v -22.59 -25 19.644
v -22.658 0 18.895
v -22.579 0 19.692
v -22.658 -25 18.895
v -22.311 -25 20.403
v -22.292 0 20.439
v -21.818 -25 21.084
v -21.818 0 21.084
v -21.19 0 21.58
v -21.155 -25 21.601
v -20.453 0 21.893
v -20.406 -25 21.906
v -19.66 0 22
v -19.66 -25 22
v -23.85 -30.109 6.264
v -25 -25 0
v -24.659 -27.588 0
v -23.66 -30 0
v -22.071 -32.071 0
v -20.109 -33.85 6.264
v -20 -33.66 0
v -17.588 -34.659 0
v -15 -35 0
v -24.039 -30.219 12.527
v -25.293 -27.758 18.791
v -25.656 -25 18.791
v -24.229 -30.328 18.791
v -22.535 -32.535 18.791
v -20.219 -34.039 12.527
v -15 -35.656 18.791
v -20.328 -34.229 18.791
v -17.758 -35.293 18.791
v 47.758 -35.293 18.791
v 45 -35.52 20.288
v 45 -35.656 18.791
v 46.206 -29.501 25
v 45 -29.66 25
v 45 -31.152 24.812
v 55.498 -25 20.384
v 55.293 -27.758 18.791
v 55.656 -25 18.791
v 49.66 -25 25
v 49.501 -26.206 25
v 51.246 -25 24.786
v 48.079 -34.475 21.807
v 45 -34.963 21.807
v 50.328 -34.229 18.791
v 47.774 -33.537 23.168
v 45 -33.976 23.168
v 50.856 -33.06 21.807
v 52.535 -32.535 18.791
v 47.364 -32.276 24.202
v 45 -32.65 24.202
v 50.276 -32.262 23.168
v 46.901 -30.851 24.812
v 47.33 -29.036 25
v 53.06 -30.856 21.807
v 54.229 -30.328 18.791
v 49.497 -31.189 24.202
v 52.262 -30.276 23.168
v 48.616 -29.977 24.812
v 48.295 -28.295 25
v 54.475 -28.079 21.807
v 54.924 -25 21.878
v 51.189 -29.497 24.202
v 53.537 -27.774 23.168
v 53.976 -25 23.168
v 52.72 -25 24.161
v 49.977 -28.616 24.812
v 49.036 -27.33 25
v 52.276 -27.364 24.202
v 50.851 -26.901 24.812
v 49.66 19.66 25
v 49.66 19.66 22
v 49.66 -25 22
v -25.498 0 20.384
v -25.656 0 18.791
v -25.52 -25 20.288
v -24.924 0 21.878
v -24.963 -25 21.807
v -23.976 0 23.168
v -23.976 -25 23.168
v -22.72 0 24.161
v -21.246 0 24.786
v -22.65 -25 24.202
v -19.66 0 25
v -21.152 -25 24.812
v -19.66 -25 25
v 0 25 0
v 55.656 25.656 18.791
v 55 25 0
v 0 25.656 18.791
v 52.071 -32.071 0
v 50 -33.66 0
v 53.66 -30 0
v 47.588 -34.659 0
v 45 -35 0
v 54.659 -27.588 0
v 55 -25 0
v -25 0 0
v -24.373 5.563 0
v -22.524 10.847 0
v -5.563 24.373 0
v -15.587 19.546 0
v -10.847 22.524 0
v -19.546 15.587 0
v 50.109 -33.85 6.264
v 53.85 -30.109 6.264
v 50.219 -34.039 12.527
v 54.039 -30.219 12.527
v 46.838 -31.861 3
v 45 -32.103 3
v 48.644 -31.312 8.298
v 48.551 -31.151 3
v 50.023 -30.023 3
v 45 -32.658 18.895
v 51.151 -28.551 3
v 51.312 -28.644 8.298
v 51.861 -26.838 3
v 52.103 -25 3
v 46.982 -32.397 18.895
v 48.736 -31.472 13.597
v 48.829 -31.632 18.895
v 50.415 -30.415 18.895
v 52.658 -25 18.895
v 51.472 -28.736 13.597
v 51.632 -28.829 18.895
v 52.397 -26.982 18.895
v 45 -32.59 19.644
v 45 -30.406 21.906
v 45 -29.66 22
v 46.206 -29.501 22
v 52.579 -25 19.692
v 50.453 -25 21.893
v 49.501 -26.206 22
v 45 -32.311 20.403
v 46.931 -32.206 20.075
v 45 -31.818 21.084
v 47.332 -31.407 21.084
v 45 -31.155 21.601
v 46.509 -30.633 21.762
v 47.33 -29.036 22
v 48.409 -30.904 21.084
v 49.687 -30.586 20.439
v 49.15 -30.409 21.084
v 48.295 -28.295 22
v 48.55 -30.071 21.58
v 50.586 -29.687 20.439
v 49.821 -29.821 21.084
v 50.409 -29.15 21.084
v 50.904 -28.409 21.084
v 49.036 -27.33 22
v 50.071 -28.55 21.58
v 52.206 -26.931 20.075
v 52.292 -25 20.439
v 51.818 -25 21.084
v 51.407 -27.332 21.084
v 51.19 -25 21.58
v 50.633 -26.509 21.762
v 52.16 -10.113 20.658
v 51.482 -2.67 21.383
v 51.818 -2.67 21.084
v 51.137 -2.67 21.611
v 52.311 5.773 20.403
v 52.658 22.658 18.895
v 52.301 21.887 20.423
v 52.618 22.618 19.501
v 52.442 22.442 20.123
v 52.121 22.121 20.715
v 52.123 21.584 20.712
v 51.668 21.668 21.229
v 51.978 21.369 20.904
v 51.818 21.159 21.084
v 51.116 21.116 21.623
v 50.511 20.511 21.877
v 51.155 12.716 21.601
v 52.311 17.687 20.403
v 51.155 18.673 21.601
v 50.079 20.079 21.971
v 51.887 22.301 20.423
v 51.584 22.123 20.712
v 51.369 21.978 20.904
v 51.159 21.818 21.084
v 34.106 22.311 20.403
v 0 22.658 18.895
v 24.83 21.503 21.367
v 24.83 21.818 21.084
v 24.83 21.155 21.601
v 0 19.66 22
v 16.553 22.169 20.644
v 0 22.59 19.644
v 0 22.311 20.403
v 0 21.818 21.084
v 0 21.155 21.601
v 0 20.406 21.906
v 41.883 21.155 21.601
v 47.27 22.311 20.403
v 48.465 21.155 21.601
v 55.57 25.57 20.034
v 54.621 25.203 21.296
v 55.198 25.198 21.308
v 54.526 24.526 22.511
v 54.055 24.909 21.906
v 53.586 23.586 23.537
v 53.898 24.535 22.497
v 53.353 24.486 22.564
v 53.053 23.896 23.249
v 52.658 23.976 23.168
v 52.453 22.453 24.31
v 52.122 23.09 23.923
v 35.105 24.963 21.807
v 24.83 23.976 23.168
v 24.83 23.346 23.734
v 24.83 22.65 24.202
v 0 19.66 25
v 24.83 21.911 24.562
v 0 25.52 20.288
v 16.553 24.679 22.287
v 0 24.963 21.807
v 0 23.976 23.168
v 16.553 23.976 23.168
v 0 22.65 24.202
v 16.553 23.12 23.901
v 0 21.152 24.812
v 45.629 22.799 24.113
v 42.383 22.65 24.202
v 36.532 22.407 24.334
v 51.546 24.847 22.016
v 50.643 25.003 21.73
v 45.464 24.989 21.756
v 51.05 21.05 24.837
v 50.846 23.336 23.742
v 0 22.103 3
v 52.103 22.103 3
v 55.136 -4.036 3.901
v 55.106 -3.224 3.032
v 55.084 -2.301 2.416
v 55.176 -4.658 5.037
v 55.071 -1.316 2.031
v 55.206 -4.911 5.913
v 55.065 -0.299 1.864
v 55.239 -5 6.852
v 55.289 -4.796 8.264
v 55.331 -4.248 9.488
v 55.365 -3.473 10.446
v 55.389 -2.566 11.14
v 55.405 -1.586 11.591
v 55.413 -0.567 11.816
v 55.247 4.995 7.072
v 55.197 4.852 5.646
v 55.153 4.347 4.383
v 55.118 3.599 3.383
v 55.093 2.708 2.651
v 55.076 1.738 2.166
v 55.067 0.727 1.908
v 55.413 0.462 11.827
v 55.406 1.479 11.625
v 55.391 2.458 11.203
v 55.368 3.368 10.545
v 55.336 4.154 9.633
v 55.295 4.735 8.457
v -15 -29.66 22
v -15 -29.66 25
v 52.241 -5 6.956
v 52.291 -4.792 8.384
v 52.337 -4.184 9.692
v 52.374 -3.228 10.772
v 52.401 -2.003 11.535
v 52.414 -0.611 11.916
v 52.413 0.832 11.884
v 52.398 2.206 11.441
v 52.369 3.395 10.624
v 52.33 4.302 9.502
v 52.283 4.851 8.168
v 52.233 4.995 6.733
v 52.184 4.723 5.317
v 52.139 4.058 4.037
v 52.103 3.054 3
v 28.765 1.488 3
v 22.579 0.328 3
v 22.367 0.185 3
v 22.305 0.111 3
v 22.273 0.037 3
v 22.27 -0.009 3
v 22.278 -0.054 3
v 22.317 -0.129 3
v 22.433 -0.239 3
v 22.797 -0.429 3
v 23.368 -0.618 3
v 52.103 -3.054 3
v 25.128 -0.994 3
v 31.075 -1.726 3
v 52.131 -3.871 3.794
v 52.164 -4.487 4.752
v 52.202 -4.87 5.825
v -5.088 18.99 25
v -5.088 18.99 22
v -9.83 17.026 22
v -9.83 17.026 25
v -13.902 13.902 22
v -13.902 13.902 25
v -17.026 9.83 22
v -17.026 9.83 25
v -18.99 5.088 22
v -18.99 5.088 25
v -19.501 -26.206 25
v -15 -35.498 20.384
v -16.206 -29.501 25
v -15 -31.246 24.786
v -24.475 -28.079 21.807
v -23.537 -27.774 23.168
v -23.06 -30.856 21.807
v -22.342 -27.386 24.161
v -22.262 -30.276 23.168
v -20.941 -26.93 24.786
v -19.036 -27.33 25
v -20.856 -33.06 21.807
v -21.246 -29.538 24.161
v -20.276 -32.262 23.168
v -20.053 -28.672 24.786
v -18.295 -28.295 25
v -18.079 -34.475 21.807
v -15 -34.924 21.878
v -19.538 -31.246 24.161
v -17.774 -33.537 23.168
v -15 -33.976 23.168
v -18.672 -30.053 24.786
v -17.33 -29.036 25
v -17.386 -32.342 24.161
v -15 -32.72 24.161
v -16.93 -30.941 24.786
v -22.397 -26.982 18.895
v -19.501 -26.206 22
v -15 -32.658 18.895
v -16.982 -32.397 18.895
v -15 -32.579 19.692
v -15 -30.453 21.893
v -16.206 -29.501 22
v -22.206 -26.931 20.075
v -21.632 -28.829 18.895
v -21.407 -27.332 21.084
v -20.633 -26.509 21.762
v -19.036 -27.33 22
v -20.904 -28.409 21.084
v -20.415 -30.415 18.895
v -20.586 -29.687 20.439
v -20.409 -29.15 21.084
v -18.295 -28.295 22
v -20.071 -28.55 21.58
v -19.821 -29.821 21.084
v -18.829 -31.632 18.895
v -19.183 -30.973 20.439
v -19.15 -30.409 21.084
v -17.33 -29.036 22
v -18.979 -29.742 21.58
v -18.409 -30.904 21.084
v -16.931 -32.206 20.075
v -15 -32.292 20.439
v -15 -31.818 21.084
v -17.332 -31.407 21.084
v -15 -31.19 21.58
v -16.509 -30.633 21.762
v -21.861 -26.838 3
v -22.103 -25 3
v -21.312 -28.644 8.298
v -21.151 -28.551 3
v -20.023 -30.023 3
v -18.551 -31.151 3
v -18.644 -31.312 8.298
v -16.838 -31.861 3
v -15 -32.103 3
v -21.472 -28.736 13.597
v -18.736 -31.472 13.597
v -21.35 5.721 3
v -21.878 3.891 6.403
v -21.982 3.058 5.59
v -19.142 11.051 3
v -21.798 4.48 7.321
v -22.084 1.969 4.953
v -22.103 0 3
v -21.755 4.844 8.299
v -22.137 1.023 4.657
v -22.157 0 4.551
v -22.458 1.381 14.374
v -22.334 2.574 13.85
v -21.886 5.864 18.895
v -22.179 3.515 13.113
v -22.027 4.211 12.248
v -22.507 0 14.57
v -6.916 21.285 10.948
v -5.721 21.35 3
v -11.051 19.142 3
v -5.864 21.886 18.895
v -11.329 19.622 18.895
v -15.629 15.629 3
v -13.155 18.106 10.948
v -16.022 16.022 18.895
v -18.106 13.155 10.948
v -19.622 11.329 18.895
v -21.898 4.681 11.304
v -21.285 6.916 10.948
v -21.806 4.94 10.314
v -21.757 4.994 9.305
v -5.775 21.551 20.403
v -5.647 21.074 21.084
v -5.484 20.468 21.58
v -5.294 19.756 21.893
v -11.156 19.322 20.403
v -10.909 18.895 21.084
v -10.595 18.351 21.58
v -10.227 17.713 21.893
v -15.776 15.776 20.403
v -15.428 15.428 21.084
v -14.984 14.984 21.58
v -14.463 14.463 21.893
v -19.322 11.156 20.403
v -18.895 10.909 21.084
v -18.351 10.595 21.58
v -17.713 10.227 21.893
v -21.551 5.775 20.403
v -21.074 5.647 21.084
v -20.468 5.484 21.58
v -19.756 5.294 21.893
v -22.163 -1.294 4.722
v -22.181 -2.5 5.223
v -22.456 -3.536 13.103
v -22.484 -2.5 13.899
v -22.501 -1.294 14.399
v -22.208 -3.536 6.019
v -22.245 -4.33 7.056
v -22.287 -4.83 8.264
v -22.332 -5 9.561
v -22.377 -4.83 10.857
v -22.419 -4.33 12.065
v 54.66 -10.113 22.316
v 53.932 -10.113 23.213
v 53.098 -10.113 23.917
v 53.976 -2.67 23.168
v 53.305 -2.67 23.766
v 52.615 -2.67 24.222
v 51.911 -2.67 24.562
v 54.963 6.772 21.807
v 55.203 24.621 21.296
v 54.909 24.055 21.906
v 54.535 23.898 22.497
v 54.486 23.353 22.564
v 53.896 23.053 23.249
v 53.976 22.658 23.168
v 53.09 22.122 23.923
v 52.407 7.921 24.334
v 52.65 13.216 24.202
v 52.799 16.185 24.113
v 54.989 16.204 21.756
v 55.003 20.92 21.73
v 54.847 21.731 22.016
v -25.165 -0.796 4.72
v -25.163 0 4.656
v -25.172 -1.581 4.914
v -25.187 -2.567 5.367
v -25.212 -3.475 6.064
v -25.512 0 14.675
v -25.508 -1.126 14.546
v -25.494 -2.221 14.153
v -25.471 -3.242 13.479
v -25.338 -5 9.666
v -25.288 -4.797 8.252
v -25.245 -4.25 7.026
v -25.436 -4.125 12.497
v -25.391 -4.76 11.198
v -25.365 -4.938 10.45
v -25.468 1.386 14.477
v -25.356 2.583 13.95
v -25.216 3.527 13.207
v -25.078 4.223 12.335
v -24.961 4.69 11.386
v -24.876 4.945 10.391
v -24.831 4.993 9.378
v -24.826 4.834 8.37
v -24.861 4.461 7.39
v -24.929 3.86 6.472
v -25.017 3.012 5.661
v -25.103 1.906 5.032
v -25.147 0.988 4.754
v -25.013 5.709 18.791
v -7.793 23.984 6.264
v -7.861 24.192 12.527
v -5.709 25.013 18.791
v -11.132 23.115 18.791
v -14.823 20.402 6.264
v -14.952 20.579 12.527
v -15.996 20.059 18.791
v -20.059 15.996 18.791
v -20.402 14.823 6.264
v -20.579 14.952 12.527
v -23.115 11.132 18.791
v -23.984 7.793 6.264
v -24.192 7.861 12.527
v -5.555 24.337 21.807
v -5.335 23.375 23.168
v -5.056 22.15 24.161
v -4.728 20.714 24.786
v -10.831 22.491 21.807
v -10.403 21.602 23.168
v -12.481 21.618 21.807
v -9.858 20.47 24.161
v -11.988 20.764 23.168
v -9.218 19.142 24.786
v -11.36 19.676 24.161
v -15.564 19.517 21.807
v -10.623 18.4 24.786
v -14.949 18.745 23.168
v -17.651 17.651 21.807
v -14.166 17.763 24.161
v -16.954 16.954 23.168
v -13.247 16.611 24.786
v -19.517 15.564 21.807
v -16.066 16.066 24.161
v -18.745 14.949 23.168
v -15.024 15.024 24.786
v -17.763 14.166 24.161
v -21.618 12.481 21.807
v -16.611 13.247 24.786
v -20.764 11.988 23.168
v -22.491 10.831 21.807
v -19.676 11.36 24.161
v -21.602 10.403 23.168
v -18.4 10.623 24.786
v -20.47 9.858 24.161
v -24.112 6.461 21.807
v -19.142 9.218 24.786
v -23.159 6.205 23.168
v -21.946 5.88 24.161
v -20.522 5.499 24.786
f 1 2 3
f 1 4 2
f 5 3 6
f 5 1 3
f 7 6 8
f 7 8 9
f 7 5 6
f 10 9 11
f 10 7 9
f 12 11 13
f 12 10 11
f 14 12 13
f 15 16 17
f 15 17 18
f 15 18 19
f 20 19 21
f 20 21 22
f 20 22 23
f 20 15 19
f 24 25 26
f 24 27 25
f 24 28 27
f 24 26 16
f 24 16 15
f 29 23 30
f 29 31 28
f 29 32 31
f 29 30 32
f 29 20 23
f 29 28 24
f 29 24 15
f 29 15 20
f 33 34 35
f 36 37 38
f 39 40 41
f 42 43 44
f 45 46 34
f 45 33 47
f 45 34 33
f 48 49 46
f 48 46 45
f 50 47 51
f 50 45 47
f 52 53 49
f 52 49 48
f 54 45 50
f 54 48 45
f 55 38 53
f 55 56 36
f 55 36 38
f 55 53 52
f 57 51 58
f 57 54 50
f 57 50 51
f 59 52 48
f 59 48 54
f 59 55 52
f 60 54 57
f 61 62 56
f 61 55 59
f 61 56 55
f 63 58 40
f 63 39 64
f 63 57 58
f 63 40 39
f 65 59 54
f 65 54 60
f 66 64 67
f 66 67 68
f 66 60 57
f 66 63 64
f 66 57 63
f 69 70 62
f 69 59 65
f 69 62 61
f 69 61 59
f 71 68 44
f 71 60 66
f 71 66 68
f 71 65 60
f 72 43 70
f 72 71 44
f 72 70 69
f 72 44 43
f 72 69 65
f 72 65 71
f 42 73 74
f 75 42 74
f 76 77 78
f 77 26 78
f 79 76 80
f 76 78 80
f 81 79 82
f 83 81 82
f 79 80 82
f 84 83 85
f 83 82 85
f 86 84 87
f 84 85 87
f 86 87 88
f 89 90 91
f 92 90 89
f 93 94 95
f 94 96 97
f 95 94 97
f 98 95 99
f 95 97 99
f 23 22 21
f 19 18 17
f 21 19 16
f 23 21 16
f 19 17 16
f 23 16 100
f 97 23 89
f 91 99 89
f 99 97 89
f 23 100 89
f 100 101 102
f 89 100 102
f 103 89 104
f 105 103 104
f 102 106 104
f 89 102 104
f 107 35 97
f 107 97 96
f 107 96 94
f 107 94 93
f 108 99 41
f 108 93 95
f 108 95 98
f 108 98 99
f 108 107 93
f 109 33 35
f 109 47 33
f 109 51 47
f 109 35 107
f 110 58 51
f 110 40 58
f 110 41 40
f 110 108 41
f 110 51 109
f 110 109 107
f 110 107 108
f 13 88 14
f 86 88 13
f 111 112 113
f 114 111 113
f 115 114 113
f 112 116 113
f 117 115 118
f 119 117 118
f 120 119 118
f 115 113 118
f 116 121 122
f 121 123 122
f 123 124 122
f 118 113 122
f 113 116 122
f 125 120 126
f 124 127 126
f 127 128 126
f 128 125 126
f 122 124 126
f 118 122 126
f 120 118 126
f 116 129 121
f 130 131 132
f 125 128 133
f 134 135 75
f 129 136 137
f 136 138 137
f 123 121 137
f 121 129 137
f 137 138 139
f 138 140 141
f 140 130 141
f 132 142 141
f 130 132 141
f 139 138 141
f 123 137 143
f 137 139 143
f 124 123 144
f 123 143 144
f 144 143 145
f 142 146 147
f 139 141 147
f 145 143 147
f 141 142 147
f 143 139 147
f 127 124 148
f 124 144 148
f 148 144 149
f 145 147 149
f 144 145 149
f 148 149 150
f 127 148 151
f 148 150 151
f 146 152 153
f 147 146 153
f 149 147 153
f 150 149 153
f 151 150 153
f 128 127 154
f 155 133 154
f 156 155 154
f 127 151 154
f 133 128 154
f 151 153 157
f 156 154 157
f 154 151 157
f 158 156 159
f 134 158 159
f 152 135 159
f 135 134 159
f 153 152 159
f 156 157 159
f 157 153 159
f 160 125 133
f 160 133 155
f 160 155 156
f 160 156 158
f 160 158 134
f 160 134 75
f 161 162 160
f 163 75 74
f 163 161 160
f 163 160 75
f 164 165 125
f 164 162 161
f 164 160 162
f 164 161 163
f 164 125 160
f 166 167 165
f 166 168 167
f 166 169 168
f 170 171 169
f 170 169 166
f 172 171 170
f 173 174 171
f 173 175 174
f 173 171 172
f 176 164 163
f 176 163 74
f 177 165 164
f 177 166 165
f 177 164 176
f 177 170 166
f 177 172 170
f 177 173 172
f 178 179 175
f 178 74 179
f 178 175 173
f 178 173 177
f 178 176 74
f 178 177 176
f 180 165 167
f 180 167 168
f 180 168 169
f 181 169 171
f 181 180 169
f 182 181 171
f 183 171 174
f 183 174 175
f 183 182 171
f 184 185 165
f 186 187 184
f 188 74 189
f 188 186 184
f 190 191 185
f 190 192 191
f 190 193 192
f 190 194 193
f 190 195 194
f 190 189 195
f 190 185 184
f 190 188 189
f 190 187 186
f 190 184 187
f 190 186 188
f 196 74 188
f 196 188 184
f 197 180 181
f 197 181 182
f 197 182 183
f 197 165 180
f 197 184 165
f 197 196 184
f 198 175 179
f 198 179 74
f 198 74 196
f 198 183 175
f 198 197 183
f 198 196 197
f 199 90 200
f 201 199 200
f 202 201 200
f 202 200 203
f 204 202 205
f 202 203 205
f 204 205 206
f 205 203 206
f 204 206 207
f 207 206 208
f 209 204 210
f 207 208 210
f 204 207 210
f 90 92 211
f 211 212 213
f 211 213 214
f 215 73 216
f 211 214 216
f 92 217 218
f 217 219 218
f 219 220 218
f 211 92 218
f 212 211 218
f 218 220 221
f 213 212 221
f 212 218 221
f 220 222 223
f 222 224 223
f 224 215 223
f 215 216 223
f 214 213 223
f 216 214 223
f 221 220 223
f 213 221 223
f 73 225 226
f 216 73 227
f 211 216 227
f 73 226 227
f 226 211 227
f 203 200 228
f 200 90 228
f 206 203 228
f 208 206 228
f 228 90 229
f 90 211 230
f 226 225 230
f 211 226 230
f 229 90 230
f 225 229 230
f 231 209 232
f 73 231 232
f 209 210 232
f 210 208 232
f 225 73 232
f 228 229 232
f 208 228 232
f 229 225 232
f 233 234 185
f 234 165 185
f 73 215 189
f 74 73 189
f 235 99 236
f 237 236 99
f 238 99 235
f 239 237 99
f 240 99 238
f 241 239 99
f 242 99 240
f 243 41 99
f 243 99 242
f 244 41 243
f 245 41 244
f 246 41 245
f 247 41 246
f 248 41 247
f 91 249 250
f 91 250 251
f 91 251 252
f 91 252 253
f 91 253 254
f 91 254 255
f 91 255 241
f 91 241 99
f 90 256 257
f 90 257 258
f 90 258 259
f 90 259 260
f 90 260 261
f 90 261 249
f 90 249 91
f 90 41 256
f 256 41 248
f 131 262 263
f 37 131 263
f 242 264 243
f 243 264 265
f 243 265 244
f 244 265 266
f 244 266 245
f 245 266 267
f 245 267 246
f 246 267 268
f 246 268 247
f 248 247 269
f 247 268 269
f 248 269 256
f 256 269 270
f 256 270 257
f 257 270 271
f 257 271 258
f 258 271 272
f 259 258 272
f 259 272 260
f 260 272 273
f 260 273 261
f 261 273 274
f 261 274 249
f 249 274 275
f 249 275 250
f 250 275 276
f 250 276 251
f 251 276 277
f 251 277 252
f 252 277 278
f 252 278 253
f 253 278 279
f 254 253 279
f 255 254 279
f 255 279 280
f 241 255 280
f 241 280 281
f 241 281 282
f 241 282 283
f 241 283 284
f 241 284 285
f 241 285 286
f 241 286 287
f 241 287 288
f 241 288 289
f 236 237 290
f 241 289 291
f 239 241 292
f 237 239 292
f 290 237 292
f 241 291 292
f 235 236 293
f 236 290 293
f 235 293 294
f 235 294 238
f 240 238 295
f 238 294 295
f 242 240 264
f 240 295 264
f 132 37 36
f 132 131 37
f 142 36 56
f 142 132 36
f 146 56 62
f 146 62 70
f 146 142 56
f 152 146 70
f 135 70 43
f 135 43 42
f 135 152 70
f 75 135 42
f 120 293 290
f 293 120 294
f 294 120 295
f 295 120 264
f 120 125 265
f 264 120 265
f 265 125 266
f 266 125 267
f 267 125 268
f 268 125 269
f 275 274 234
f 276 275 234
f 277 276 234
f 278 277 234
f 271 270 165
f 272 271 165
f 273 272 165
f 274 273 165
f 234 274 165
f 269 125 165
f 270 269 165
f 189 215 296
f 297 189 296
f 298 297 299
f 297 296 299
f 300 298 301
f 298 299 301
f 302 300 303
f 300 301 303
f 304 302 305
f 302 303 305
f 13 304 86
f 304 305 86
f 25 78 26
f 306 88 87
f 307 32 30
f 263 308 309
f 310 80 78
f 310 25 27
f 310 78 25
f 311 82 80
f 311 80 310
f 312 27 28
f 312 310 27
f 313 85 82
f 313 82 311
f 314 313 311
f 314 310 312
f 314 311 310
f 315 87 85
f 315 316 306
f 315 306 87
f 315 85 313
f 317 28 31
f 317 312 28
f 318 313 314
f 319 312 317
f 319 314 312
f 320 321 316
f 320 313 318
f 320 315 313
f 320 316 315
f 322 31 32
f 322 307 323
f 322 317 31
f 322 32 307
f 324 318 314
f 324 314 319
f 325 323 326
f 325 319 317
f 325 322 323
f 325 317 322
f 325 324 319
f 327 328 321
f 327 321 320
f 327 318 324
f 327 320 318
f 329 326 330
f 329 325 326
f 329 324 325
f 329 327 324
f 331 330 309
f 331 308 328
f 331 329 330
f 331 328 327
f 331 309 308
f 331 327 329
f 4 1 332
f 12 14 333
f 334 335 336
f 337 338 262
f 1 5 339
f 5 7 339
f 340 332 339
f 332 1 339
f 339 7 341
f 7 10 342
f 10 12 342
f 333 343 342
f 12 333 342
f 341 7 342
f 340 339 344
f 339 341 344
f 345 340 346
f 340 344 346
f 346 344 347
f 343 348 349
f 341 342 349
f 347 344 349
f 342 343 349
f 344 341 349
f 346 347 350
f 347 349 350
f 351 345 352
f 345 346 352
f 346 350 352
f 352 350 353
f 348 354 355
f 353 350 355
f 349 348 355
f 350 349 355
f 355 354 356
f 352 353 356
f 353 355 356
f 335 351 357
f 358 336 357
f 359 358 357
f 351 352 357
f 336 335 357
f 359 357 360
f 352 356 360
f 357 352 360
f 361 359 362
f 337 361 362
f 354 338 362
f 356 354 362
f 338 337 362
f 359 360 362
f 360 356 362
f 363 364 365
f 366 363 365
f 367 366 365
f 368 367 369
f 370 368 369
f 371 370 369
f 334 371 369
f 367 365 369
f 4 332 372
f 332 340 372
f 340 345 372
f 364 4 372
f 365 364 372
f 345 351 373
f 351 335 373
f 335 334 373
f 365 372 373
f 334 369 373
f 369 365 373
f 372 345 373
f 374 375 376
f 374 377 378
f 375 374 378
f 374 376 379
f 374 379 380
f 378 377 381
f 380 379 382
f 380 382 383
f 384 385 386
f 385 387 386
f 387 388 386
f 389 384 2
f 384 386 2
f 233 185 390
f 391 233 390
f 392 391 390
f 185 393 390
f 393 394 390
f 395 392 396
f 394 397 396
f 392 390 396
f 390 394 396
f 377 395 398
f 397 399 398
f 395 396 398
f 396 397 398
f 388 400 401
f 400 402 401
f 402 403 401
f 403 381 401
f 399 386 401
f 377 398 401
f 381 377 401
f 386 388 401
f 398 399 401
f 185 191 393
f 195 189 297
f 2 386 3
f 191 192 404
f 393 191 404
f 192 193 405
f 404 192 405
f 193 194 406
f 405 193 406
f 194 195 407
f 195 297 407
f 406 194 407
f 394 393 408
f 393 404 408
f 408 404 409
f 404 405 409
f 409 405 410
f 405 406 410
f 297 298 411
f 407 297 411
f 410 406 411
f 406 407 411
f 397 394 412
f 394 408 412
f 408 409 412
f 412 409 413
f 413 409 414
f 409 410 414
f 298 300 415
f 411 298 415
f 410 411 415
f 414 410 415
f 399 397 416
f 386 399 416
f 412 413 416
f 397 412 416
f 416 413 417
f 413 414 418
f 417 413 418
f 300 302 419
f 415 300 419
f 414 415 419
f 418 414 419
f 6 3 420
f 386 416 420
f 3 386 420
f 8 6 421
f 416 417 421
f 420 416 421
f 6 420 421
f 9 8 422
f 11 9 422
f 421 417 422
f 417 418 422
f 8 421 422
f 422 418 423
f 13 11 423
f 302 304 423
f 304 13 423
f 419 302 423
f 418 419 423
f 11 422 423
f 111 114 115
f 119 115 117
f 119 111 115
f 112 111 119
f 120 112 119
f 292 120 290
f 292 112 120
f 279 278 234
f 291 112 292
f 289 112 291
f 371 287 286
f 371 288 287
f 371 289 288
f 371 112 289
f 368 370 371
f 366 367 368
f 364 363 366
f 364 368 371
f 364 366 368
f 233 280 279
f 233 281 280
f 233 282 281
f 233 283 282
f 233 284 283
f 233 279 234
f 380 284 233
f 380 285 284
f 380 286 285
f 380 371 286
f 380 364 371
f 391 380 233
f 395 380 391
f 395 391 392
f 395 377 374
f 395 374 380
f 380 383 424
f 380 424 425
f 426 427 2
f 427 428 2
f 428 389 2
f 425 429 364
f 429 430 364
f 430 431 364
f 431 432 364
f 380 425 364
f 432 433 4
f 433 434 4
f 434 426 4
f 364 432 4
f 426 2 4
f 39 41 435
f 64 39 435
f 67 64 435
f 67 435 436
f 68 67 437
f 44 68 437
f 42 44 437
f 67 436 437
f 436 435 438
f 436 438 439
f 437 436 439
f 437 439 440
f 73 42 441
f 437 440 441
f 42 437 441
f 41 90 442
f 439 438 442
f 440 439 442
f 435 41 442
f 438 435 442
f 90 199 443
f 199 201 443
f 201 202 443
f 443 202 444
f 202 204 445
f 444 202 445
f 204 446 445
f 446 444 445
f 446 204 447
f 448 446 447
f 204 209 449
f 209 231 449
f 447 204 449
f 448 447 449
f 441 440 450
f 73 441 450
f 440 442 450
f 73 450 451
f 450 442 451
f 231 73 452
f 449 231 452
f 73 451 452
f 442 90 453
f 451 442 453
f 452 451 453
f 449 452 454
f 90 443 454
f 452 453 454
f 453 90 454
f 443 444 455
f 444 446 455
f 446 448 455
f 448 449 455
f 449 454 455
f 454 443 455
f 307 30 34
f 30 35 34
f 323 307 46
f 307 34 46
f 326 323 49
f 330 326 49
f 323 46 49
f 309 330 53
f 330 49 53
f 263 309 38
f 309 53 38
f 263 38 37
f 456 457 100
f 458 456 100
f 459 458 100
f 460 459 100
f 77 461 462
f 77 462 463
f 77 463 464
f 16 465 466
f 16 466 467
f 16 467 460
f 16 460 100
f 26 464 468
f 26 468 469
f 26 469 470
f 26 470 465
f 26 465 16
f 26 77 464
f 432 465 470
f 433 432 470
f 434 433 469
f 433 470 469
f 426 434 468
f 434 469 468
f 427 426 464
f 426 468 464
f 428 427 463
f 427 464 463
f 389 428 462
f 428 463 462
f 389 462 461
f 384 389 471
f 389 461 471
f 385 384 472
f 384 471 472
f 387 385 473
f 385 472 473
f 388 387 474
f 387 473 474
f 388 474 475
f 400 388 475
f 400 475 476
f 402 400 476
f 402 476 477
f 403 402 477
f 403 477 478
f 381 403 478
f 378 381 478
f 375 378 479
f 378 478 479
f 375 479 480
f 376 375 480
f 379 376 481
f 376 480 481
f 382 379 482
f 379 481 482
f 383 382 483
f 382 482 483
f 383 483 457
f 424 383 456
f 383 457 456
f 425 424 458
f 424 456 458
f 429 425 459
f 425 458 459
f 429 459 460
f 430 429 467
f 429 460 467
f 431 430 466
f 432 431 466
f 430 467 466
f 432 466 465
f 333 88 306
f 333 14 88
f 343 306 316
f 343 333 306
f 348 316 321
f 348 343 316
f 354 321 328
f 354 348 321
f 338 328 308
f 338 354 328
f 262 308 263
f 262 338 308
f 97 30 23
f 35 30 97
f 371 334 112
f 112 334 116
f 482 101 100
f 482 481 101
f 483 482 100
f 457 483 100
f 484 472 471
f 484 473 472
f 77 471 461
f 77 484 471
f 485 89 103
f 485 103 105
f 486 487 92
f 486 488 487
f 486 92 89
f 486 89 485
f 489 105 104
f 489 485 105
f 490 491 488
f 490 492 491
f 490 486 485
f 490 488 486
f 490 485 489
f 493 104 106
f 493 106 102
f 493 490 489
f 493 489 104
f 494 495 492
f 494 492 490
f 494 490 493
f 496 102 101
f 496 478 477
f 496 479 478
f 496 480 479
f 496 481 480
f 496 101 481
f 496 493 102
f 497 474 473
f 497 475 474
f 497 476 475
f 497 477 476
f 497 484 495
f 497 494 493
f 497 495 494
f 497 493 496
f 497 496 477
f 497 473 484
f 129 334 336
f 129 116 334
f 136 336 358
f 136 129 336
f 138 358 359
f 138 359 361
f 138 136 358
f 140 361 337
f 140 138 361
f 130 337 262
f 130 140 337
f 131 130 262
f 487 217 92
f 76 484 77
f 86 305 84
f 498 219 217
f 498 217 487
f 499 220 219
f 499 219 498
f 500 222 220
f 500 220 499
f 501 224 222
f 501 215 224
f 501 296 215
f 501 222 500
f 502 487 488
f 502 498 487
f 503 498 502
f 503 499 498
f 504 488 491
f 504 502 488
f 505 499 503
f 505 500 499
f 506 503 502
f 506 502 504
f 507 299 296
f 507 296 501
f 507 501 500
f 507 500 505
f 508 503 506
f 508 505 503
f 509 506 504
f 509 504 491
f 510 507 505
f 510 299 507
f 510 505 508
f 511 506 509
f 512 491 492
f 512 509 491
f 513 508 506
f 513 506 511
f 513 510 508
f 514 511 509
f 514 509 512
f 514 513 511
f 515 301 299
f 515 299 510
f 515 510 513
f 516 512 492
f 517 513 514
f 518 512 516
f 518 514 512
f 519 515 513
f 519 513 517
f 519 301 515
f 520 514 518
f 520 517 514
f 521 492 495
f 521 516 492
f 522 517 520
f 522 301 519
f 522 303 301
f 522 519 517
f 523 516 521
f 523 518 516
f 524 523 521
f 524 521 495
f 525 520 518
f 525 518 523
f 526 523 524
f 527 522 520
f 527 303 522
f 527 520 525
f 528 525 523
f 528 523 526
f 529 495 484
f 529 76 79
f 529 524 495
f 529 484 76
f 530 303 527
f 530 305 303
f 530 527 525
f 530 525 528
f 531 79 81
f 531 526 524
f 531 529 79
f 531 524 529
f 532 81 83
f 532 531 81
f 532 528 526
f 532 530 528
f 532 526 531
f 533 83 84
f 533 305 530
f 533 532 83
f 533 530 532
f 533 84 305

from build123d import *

# Parameters (mm, degrees)
F1_DEPTH = 25
F1_TAPER = -2
F2_R     = 6
F3_T     = 3
F5_D     = 10


# Not quite as in the source:
# - a shell that OpenCascade refuses in one call is made with other operations: the cavity is built on its own and cut out


with BuildPart() as f1:
    # F0 (on Top) → F1 (new body)
    with BuildSketch(Plane.XY):
        with BuildLine():
            Line((55, 25), (0, 25))
            ThreePointArc((0, 25), (-17.6776695297, 17.6776695297), (-25, 0))
            Line((-25, 0), (-25, -25))
            ThreePointArc((-25, -25), (-22.0710678119, -32.0710678119), (-15, -35))
            Line((-15, -35), (45, -35))
            ThreePointArc((45, -35), (52.0710678119, -32.0710678119), (55, -25))
            Line((55, -25), (55, 25))
        make_face()
    extrude(amount=F1_DEPTH, taper=F1_TAPER)

    # F2
    f2_edges = [f1.edges().sort_by_distance(p)[0] for p in [
        (15, -35.873019, 25),
    ]]
    fillet(f2_edges, radius=F2_R)

    # F3: shell of thickness 3, made by hand


with BuildPart() as f3_core1:
    # F3_t2: copy of F1
    add(f1.part)

    # the walls: a layer under each face that stays
    f3_faces = [f3_core1.faces().sort_by_distance(p)[0] for p in [
        (27.6640479465, 25.328095893, 9.3954370929),
        (-17.9096696286, 17.9096696286, 9.395488449),
        (27.794131329, 23.9760199568, 23.1679440438),
        (15, -5, 0),
        (55.3280962996, 0.1640481498, 9.3954487356),
        (-25.3280911583, -12.5, 9.3953015099),
        (-16.9638078754, 16.9431979233, 23.1679501064),
        (53.9760549891, 0.2869115749, 23.1679425379),
        (-22.3030632948, -32.3030632948, 9.3953015099),
        (15, -35.3280911583, 9.3953015099),
        (52.3030694739, -32.3030694739, 9.3955517523),
        (-23.9758761566, -12.5, 23.1679502228),
        (51.3377505062, -31.3560472609, 23.1679500628),
        (15, -33.9758761566, 23.1679502228),
        (-21.3469028974, -31.3469028974, 23.1679502228),
    ]]
    thicken(f3_faces, amount=-F3_T, mode=Mode.SUBTRACT)


with BuildPart() as f1_1:
    add(f1.part)

    # what is left inside the walls is the cavity
    f3_cavity = [f3_core1.part.solids().sort_by_distance(p)[0] for p in [
        (27.367645, -5, 3.03),
    ]]
    add(f3_cavity, mode=Mode.SUBTRACT)

    # F5 (through all)
    with Locations(Plane(origin=(54.9330113821, 0, -1.918303028), x_dir=(0, 1, 0), z_dir=(0.999390827, 0, -0.0348994967))):
        with Locations((0, 8.7753692642)):
            Hole(F5_D / 2)


solid = f1_1.part
